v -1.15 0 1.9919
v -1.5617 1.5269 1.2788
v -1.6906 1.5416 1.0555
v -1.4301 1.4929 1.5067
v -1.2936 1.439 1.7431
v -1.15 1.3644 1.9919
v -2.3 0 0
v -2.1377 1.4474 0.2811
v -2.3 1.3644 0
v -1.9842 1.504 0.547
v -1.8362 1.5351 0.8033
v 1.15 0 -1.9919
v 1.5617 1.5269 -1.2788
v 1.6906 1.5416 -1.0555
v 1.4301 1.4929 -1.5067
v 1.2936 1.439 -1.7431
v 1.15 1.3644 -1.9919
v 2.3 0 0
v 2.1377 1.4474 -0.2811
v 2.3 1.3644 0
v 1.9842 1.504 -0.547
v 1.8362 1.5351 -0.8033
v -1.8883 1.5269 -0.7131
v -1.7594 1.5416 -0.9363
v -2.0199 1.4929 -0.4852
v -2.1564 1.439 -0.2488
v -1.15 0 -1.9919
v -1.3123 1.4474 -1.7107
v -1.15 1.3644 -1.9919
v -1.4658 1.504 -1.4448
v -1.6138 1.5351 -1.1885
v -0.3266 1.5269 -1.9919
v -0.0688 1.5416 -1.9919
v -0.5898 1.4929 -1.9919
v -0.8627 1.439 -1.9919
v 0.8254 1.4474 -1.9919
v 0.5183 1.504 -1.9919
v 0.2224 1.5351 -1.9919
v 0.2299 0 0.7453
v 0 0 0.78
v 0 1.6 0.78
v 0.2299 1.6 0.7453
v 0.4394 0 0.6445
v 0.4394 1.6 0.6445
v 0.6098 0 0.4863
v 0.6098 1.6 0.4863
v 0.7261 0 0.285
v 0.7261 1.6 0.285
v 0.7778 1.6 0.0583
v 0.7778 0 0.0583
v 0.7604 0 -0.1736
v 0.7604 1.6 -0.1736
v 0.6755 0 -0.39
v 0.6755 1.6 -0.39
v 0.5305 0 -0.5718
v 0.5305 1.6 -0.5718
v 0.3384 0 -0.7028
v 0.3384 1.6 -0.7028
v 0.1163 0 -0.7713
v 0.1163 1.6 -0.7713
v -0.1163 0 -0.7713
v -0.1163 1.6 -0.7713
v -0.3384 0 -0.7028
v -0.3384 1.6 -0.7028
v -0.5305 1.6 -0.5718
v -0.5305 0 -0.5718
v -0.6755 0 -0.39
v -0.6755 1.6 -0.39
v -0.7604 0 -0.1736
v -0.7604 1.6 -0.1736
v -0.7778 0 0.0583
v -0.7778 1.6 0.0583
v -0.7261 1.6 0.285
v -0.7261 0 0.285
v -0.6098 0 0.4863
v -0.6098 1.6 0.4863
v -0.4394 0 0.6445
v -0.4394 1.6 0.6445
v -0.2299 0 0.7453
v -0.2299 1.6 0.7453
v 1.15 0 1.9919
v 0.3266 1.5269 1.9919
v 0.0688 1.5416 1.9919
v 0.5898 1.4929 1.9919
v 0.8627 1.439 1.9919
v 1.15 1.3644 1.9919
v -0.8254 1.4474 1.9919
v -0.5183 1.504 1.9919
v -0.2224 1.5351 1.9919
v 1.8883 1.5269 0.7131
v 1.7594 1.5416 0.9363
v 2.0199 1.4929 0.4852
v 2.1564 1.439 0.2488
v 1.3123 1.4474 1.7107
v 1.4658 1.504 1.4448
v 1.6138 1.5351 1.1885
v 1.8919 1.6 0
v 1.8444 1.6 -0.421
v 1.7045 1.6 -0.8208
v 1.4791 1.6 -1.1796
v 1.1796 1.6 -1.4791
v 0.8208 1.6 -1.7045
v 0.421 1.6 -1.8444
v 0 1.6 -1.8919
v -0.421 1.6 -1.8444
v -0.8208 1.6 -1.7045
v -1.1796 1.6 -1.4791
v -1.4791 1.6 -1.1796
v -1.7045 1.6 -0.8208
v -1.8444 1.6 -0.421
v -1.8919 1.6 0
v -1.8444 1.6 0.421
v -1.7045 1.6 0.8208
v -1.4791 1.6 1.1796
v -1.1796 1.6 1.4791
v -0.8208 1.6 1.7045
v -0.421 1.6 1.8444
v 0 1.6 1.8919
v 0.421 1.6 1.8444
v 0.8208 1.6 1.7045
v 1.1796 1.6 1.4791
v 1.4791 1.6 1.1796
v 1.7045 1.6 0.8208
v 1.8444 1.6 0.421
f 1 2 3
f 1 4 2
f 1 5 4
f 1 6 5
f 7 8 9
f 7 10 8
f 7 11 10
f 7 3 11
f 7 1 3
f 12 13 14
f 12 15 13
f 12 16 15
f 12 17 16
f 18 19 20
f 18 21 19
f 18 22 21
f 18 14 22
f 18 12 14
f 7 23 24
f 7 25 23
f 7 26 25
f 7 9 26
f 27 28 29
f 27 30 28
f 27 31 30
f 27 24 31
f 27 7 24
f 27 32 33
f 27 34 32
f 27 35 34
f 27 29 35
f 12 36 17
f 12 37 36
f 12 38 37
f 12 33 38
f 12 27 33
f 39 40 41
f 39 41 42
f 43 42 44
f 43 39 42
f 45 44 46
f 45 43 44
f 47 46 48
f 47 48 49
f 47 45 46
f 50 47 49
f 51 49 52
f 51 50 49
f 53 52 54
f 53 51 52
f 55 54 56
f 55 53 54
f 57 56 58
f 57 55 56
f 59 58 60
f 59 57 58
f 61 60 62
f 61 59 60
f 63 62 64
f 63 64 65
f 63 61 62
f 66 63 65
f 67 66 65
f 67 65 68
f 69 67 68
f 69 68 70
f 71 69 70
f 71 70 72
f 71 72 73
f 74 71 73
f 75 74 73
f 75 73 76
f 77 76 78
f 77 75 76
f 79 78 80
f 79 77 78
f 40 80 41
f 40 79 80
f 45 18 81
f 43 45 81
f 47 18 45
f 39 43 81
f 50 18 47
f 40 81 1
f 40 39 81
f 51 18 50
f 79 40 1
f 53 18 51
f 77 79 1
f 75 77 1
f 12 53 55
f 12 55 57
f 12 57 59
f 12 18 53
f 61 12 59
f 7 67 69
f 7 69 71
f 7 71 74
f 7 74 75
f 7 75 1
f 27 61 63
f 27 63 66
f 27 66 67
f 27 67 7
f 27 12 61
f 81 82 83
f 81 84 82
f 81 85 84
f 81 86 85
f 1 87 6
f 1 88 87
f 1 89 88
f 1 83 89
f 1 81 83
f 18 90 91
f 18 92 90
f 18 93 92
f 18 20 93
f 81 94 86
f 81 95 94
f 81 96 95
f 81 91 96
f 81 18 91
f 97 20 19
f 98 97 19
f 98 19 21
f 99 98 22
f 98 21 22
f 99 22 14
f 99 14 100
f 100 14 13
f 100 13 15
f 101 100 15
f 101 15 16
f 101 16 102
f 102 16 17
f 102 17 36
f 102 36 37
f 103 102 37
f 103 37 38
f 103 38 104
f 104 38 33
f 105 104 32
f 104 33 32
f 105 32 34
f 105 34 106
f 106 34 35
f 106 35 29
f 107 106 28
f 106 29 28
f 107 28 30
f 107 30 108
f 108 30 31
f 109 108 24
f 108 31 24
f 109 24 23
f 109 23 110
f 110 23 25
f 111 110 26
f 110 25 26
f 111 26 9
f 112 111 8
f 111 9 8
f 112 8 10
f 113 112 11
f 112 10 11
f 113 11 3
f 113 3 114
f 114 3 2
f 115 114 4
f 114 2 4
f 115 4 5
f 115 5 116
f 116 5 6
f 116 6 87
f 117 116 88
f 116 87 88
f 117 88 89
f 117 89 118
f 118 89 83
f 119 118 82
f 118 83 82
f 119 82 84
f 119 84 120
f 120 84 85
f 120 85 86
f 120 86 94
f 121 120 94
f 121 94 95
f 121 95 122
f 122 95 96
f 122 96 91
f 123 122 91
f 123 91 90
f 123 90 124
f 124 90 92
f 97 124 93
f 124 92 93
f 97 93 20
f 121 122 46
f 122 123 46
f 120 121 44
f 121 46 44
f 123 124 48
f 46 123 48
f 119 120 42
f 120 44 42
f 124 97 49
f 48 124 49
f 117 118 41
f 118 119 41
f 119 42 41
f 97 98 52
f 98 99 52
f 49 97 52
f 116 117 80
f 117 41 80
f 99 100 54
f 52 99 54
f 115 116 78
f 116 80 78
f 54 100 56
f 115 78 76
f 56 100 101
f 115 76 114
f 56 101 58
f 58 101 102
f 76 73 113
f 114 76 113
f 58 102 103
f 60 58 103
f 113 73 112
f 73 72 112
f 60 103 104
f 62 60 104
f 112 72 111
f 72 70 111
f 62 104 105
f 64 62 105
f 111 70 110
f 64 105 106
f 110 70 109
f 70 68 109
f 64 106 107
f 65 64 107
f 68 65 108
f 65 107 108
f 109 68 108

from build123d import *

# Parameters (mm, degrees)
SKETCH1_R          = 0.78
BASE_EXTRUDE_DEPTH = 1.6


# Read off the part's stored shape, not the designer's step: Cut-Extrude1
with BuildPart() as part:
    # Sketch1 → Base-Extrude (new body)
    with BuildSketch(Plane(origin=(0, 0, 0), x_dir=(1, 0, 0), z_dir=(0, 1, 0))):
        Polygon((-1.15, 1.991858429), (1.15, 1.991858429), (2.3, 0), (1.15, -1.991858429), (-1.15, -1.991858429), (-2.3, 0), align=None)
        with Locations(Location((0, 0, 0), (0, 0, 270))):
            Circle(SKETCH1_R, mode=Mode.SUBTRACT)
    extrude(amount=BASE_EXTRUDE_DEPTH)

    # Cut-Extrude1 outline → Cut-Extrude1 (revolve, cut)
    with BuildSketch(Plane.XY):
        Polygon((2.3, 1.6), (1.891858429, 1.6), (2.3, 1.364359354), align=None)
    revolve(axis=Axis((0, 0, 0), (0, 1, 0)), mode=Mode.SUBTRACT)


solid = part.part
